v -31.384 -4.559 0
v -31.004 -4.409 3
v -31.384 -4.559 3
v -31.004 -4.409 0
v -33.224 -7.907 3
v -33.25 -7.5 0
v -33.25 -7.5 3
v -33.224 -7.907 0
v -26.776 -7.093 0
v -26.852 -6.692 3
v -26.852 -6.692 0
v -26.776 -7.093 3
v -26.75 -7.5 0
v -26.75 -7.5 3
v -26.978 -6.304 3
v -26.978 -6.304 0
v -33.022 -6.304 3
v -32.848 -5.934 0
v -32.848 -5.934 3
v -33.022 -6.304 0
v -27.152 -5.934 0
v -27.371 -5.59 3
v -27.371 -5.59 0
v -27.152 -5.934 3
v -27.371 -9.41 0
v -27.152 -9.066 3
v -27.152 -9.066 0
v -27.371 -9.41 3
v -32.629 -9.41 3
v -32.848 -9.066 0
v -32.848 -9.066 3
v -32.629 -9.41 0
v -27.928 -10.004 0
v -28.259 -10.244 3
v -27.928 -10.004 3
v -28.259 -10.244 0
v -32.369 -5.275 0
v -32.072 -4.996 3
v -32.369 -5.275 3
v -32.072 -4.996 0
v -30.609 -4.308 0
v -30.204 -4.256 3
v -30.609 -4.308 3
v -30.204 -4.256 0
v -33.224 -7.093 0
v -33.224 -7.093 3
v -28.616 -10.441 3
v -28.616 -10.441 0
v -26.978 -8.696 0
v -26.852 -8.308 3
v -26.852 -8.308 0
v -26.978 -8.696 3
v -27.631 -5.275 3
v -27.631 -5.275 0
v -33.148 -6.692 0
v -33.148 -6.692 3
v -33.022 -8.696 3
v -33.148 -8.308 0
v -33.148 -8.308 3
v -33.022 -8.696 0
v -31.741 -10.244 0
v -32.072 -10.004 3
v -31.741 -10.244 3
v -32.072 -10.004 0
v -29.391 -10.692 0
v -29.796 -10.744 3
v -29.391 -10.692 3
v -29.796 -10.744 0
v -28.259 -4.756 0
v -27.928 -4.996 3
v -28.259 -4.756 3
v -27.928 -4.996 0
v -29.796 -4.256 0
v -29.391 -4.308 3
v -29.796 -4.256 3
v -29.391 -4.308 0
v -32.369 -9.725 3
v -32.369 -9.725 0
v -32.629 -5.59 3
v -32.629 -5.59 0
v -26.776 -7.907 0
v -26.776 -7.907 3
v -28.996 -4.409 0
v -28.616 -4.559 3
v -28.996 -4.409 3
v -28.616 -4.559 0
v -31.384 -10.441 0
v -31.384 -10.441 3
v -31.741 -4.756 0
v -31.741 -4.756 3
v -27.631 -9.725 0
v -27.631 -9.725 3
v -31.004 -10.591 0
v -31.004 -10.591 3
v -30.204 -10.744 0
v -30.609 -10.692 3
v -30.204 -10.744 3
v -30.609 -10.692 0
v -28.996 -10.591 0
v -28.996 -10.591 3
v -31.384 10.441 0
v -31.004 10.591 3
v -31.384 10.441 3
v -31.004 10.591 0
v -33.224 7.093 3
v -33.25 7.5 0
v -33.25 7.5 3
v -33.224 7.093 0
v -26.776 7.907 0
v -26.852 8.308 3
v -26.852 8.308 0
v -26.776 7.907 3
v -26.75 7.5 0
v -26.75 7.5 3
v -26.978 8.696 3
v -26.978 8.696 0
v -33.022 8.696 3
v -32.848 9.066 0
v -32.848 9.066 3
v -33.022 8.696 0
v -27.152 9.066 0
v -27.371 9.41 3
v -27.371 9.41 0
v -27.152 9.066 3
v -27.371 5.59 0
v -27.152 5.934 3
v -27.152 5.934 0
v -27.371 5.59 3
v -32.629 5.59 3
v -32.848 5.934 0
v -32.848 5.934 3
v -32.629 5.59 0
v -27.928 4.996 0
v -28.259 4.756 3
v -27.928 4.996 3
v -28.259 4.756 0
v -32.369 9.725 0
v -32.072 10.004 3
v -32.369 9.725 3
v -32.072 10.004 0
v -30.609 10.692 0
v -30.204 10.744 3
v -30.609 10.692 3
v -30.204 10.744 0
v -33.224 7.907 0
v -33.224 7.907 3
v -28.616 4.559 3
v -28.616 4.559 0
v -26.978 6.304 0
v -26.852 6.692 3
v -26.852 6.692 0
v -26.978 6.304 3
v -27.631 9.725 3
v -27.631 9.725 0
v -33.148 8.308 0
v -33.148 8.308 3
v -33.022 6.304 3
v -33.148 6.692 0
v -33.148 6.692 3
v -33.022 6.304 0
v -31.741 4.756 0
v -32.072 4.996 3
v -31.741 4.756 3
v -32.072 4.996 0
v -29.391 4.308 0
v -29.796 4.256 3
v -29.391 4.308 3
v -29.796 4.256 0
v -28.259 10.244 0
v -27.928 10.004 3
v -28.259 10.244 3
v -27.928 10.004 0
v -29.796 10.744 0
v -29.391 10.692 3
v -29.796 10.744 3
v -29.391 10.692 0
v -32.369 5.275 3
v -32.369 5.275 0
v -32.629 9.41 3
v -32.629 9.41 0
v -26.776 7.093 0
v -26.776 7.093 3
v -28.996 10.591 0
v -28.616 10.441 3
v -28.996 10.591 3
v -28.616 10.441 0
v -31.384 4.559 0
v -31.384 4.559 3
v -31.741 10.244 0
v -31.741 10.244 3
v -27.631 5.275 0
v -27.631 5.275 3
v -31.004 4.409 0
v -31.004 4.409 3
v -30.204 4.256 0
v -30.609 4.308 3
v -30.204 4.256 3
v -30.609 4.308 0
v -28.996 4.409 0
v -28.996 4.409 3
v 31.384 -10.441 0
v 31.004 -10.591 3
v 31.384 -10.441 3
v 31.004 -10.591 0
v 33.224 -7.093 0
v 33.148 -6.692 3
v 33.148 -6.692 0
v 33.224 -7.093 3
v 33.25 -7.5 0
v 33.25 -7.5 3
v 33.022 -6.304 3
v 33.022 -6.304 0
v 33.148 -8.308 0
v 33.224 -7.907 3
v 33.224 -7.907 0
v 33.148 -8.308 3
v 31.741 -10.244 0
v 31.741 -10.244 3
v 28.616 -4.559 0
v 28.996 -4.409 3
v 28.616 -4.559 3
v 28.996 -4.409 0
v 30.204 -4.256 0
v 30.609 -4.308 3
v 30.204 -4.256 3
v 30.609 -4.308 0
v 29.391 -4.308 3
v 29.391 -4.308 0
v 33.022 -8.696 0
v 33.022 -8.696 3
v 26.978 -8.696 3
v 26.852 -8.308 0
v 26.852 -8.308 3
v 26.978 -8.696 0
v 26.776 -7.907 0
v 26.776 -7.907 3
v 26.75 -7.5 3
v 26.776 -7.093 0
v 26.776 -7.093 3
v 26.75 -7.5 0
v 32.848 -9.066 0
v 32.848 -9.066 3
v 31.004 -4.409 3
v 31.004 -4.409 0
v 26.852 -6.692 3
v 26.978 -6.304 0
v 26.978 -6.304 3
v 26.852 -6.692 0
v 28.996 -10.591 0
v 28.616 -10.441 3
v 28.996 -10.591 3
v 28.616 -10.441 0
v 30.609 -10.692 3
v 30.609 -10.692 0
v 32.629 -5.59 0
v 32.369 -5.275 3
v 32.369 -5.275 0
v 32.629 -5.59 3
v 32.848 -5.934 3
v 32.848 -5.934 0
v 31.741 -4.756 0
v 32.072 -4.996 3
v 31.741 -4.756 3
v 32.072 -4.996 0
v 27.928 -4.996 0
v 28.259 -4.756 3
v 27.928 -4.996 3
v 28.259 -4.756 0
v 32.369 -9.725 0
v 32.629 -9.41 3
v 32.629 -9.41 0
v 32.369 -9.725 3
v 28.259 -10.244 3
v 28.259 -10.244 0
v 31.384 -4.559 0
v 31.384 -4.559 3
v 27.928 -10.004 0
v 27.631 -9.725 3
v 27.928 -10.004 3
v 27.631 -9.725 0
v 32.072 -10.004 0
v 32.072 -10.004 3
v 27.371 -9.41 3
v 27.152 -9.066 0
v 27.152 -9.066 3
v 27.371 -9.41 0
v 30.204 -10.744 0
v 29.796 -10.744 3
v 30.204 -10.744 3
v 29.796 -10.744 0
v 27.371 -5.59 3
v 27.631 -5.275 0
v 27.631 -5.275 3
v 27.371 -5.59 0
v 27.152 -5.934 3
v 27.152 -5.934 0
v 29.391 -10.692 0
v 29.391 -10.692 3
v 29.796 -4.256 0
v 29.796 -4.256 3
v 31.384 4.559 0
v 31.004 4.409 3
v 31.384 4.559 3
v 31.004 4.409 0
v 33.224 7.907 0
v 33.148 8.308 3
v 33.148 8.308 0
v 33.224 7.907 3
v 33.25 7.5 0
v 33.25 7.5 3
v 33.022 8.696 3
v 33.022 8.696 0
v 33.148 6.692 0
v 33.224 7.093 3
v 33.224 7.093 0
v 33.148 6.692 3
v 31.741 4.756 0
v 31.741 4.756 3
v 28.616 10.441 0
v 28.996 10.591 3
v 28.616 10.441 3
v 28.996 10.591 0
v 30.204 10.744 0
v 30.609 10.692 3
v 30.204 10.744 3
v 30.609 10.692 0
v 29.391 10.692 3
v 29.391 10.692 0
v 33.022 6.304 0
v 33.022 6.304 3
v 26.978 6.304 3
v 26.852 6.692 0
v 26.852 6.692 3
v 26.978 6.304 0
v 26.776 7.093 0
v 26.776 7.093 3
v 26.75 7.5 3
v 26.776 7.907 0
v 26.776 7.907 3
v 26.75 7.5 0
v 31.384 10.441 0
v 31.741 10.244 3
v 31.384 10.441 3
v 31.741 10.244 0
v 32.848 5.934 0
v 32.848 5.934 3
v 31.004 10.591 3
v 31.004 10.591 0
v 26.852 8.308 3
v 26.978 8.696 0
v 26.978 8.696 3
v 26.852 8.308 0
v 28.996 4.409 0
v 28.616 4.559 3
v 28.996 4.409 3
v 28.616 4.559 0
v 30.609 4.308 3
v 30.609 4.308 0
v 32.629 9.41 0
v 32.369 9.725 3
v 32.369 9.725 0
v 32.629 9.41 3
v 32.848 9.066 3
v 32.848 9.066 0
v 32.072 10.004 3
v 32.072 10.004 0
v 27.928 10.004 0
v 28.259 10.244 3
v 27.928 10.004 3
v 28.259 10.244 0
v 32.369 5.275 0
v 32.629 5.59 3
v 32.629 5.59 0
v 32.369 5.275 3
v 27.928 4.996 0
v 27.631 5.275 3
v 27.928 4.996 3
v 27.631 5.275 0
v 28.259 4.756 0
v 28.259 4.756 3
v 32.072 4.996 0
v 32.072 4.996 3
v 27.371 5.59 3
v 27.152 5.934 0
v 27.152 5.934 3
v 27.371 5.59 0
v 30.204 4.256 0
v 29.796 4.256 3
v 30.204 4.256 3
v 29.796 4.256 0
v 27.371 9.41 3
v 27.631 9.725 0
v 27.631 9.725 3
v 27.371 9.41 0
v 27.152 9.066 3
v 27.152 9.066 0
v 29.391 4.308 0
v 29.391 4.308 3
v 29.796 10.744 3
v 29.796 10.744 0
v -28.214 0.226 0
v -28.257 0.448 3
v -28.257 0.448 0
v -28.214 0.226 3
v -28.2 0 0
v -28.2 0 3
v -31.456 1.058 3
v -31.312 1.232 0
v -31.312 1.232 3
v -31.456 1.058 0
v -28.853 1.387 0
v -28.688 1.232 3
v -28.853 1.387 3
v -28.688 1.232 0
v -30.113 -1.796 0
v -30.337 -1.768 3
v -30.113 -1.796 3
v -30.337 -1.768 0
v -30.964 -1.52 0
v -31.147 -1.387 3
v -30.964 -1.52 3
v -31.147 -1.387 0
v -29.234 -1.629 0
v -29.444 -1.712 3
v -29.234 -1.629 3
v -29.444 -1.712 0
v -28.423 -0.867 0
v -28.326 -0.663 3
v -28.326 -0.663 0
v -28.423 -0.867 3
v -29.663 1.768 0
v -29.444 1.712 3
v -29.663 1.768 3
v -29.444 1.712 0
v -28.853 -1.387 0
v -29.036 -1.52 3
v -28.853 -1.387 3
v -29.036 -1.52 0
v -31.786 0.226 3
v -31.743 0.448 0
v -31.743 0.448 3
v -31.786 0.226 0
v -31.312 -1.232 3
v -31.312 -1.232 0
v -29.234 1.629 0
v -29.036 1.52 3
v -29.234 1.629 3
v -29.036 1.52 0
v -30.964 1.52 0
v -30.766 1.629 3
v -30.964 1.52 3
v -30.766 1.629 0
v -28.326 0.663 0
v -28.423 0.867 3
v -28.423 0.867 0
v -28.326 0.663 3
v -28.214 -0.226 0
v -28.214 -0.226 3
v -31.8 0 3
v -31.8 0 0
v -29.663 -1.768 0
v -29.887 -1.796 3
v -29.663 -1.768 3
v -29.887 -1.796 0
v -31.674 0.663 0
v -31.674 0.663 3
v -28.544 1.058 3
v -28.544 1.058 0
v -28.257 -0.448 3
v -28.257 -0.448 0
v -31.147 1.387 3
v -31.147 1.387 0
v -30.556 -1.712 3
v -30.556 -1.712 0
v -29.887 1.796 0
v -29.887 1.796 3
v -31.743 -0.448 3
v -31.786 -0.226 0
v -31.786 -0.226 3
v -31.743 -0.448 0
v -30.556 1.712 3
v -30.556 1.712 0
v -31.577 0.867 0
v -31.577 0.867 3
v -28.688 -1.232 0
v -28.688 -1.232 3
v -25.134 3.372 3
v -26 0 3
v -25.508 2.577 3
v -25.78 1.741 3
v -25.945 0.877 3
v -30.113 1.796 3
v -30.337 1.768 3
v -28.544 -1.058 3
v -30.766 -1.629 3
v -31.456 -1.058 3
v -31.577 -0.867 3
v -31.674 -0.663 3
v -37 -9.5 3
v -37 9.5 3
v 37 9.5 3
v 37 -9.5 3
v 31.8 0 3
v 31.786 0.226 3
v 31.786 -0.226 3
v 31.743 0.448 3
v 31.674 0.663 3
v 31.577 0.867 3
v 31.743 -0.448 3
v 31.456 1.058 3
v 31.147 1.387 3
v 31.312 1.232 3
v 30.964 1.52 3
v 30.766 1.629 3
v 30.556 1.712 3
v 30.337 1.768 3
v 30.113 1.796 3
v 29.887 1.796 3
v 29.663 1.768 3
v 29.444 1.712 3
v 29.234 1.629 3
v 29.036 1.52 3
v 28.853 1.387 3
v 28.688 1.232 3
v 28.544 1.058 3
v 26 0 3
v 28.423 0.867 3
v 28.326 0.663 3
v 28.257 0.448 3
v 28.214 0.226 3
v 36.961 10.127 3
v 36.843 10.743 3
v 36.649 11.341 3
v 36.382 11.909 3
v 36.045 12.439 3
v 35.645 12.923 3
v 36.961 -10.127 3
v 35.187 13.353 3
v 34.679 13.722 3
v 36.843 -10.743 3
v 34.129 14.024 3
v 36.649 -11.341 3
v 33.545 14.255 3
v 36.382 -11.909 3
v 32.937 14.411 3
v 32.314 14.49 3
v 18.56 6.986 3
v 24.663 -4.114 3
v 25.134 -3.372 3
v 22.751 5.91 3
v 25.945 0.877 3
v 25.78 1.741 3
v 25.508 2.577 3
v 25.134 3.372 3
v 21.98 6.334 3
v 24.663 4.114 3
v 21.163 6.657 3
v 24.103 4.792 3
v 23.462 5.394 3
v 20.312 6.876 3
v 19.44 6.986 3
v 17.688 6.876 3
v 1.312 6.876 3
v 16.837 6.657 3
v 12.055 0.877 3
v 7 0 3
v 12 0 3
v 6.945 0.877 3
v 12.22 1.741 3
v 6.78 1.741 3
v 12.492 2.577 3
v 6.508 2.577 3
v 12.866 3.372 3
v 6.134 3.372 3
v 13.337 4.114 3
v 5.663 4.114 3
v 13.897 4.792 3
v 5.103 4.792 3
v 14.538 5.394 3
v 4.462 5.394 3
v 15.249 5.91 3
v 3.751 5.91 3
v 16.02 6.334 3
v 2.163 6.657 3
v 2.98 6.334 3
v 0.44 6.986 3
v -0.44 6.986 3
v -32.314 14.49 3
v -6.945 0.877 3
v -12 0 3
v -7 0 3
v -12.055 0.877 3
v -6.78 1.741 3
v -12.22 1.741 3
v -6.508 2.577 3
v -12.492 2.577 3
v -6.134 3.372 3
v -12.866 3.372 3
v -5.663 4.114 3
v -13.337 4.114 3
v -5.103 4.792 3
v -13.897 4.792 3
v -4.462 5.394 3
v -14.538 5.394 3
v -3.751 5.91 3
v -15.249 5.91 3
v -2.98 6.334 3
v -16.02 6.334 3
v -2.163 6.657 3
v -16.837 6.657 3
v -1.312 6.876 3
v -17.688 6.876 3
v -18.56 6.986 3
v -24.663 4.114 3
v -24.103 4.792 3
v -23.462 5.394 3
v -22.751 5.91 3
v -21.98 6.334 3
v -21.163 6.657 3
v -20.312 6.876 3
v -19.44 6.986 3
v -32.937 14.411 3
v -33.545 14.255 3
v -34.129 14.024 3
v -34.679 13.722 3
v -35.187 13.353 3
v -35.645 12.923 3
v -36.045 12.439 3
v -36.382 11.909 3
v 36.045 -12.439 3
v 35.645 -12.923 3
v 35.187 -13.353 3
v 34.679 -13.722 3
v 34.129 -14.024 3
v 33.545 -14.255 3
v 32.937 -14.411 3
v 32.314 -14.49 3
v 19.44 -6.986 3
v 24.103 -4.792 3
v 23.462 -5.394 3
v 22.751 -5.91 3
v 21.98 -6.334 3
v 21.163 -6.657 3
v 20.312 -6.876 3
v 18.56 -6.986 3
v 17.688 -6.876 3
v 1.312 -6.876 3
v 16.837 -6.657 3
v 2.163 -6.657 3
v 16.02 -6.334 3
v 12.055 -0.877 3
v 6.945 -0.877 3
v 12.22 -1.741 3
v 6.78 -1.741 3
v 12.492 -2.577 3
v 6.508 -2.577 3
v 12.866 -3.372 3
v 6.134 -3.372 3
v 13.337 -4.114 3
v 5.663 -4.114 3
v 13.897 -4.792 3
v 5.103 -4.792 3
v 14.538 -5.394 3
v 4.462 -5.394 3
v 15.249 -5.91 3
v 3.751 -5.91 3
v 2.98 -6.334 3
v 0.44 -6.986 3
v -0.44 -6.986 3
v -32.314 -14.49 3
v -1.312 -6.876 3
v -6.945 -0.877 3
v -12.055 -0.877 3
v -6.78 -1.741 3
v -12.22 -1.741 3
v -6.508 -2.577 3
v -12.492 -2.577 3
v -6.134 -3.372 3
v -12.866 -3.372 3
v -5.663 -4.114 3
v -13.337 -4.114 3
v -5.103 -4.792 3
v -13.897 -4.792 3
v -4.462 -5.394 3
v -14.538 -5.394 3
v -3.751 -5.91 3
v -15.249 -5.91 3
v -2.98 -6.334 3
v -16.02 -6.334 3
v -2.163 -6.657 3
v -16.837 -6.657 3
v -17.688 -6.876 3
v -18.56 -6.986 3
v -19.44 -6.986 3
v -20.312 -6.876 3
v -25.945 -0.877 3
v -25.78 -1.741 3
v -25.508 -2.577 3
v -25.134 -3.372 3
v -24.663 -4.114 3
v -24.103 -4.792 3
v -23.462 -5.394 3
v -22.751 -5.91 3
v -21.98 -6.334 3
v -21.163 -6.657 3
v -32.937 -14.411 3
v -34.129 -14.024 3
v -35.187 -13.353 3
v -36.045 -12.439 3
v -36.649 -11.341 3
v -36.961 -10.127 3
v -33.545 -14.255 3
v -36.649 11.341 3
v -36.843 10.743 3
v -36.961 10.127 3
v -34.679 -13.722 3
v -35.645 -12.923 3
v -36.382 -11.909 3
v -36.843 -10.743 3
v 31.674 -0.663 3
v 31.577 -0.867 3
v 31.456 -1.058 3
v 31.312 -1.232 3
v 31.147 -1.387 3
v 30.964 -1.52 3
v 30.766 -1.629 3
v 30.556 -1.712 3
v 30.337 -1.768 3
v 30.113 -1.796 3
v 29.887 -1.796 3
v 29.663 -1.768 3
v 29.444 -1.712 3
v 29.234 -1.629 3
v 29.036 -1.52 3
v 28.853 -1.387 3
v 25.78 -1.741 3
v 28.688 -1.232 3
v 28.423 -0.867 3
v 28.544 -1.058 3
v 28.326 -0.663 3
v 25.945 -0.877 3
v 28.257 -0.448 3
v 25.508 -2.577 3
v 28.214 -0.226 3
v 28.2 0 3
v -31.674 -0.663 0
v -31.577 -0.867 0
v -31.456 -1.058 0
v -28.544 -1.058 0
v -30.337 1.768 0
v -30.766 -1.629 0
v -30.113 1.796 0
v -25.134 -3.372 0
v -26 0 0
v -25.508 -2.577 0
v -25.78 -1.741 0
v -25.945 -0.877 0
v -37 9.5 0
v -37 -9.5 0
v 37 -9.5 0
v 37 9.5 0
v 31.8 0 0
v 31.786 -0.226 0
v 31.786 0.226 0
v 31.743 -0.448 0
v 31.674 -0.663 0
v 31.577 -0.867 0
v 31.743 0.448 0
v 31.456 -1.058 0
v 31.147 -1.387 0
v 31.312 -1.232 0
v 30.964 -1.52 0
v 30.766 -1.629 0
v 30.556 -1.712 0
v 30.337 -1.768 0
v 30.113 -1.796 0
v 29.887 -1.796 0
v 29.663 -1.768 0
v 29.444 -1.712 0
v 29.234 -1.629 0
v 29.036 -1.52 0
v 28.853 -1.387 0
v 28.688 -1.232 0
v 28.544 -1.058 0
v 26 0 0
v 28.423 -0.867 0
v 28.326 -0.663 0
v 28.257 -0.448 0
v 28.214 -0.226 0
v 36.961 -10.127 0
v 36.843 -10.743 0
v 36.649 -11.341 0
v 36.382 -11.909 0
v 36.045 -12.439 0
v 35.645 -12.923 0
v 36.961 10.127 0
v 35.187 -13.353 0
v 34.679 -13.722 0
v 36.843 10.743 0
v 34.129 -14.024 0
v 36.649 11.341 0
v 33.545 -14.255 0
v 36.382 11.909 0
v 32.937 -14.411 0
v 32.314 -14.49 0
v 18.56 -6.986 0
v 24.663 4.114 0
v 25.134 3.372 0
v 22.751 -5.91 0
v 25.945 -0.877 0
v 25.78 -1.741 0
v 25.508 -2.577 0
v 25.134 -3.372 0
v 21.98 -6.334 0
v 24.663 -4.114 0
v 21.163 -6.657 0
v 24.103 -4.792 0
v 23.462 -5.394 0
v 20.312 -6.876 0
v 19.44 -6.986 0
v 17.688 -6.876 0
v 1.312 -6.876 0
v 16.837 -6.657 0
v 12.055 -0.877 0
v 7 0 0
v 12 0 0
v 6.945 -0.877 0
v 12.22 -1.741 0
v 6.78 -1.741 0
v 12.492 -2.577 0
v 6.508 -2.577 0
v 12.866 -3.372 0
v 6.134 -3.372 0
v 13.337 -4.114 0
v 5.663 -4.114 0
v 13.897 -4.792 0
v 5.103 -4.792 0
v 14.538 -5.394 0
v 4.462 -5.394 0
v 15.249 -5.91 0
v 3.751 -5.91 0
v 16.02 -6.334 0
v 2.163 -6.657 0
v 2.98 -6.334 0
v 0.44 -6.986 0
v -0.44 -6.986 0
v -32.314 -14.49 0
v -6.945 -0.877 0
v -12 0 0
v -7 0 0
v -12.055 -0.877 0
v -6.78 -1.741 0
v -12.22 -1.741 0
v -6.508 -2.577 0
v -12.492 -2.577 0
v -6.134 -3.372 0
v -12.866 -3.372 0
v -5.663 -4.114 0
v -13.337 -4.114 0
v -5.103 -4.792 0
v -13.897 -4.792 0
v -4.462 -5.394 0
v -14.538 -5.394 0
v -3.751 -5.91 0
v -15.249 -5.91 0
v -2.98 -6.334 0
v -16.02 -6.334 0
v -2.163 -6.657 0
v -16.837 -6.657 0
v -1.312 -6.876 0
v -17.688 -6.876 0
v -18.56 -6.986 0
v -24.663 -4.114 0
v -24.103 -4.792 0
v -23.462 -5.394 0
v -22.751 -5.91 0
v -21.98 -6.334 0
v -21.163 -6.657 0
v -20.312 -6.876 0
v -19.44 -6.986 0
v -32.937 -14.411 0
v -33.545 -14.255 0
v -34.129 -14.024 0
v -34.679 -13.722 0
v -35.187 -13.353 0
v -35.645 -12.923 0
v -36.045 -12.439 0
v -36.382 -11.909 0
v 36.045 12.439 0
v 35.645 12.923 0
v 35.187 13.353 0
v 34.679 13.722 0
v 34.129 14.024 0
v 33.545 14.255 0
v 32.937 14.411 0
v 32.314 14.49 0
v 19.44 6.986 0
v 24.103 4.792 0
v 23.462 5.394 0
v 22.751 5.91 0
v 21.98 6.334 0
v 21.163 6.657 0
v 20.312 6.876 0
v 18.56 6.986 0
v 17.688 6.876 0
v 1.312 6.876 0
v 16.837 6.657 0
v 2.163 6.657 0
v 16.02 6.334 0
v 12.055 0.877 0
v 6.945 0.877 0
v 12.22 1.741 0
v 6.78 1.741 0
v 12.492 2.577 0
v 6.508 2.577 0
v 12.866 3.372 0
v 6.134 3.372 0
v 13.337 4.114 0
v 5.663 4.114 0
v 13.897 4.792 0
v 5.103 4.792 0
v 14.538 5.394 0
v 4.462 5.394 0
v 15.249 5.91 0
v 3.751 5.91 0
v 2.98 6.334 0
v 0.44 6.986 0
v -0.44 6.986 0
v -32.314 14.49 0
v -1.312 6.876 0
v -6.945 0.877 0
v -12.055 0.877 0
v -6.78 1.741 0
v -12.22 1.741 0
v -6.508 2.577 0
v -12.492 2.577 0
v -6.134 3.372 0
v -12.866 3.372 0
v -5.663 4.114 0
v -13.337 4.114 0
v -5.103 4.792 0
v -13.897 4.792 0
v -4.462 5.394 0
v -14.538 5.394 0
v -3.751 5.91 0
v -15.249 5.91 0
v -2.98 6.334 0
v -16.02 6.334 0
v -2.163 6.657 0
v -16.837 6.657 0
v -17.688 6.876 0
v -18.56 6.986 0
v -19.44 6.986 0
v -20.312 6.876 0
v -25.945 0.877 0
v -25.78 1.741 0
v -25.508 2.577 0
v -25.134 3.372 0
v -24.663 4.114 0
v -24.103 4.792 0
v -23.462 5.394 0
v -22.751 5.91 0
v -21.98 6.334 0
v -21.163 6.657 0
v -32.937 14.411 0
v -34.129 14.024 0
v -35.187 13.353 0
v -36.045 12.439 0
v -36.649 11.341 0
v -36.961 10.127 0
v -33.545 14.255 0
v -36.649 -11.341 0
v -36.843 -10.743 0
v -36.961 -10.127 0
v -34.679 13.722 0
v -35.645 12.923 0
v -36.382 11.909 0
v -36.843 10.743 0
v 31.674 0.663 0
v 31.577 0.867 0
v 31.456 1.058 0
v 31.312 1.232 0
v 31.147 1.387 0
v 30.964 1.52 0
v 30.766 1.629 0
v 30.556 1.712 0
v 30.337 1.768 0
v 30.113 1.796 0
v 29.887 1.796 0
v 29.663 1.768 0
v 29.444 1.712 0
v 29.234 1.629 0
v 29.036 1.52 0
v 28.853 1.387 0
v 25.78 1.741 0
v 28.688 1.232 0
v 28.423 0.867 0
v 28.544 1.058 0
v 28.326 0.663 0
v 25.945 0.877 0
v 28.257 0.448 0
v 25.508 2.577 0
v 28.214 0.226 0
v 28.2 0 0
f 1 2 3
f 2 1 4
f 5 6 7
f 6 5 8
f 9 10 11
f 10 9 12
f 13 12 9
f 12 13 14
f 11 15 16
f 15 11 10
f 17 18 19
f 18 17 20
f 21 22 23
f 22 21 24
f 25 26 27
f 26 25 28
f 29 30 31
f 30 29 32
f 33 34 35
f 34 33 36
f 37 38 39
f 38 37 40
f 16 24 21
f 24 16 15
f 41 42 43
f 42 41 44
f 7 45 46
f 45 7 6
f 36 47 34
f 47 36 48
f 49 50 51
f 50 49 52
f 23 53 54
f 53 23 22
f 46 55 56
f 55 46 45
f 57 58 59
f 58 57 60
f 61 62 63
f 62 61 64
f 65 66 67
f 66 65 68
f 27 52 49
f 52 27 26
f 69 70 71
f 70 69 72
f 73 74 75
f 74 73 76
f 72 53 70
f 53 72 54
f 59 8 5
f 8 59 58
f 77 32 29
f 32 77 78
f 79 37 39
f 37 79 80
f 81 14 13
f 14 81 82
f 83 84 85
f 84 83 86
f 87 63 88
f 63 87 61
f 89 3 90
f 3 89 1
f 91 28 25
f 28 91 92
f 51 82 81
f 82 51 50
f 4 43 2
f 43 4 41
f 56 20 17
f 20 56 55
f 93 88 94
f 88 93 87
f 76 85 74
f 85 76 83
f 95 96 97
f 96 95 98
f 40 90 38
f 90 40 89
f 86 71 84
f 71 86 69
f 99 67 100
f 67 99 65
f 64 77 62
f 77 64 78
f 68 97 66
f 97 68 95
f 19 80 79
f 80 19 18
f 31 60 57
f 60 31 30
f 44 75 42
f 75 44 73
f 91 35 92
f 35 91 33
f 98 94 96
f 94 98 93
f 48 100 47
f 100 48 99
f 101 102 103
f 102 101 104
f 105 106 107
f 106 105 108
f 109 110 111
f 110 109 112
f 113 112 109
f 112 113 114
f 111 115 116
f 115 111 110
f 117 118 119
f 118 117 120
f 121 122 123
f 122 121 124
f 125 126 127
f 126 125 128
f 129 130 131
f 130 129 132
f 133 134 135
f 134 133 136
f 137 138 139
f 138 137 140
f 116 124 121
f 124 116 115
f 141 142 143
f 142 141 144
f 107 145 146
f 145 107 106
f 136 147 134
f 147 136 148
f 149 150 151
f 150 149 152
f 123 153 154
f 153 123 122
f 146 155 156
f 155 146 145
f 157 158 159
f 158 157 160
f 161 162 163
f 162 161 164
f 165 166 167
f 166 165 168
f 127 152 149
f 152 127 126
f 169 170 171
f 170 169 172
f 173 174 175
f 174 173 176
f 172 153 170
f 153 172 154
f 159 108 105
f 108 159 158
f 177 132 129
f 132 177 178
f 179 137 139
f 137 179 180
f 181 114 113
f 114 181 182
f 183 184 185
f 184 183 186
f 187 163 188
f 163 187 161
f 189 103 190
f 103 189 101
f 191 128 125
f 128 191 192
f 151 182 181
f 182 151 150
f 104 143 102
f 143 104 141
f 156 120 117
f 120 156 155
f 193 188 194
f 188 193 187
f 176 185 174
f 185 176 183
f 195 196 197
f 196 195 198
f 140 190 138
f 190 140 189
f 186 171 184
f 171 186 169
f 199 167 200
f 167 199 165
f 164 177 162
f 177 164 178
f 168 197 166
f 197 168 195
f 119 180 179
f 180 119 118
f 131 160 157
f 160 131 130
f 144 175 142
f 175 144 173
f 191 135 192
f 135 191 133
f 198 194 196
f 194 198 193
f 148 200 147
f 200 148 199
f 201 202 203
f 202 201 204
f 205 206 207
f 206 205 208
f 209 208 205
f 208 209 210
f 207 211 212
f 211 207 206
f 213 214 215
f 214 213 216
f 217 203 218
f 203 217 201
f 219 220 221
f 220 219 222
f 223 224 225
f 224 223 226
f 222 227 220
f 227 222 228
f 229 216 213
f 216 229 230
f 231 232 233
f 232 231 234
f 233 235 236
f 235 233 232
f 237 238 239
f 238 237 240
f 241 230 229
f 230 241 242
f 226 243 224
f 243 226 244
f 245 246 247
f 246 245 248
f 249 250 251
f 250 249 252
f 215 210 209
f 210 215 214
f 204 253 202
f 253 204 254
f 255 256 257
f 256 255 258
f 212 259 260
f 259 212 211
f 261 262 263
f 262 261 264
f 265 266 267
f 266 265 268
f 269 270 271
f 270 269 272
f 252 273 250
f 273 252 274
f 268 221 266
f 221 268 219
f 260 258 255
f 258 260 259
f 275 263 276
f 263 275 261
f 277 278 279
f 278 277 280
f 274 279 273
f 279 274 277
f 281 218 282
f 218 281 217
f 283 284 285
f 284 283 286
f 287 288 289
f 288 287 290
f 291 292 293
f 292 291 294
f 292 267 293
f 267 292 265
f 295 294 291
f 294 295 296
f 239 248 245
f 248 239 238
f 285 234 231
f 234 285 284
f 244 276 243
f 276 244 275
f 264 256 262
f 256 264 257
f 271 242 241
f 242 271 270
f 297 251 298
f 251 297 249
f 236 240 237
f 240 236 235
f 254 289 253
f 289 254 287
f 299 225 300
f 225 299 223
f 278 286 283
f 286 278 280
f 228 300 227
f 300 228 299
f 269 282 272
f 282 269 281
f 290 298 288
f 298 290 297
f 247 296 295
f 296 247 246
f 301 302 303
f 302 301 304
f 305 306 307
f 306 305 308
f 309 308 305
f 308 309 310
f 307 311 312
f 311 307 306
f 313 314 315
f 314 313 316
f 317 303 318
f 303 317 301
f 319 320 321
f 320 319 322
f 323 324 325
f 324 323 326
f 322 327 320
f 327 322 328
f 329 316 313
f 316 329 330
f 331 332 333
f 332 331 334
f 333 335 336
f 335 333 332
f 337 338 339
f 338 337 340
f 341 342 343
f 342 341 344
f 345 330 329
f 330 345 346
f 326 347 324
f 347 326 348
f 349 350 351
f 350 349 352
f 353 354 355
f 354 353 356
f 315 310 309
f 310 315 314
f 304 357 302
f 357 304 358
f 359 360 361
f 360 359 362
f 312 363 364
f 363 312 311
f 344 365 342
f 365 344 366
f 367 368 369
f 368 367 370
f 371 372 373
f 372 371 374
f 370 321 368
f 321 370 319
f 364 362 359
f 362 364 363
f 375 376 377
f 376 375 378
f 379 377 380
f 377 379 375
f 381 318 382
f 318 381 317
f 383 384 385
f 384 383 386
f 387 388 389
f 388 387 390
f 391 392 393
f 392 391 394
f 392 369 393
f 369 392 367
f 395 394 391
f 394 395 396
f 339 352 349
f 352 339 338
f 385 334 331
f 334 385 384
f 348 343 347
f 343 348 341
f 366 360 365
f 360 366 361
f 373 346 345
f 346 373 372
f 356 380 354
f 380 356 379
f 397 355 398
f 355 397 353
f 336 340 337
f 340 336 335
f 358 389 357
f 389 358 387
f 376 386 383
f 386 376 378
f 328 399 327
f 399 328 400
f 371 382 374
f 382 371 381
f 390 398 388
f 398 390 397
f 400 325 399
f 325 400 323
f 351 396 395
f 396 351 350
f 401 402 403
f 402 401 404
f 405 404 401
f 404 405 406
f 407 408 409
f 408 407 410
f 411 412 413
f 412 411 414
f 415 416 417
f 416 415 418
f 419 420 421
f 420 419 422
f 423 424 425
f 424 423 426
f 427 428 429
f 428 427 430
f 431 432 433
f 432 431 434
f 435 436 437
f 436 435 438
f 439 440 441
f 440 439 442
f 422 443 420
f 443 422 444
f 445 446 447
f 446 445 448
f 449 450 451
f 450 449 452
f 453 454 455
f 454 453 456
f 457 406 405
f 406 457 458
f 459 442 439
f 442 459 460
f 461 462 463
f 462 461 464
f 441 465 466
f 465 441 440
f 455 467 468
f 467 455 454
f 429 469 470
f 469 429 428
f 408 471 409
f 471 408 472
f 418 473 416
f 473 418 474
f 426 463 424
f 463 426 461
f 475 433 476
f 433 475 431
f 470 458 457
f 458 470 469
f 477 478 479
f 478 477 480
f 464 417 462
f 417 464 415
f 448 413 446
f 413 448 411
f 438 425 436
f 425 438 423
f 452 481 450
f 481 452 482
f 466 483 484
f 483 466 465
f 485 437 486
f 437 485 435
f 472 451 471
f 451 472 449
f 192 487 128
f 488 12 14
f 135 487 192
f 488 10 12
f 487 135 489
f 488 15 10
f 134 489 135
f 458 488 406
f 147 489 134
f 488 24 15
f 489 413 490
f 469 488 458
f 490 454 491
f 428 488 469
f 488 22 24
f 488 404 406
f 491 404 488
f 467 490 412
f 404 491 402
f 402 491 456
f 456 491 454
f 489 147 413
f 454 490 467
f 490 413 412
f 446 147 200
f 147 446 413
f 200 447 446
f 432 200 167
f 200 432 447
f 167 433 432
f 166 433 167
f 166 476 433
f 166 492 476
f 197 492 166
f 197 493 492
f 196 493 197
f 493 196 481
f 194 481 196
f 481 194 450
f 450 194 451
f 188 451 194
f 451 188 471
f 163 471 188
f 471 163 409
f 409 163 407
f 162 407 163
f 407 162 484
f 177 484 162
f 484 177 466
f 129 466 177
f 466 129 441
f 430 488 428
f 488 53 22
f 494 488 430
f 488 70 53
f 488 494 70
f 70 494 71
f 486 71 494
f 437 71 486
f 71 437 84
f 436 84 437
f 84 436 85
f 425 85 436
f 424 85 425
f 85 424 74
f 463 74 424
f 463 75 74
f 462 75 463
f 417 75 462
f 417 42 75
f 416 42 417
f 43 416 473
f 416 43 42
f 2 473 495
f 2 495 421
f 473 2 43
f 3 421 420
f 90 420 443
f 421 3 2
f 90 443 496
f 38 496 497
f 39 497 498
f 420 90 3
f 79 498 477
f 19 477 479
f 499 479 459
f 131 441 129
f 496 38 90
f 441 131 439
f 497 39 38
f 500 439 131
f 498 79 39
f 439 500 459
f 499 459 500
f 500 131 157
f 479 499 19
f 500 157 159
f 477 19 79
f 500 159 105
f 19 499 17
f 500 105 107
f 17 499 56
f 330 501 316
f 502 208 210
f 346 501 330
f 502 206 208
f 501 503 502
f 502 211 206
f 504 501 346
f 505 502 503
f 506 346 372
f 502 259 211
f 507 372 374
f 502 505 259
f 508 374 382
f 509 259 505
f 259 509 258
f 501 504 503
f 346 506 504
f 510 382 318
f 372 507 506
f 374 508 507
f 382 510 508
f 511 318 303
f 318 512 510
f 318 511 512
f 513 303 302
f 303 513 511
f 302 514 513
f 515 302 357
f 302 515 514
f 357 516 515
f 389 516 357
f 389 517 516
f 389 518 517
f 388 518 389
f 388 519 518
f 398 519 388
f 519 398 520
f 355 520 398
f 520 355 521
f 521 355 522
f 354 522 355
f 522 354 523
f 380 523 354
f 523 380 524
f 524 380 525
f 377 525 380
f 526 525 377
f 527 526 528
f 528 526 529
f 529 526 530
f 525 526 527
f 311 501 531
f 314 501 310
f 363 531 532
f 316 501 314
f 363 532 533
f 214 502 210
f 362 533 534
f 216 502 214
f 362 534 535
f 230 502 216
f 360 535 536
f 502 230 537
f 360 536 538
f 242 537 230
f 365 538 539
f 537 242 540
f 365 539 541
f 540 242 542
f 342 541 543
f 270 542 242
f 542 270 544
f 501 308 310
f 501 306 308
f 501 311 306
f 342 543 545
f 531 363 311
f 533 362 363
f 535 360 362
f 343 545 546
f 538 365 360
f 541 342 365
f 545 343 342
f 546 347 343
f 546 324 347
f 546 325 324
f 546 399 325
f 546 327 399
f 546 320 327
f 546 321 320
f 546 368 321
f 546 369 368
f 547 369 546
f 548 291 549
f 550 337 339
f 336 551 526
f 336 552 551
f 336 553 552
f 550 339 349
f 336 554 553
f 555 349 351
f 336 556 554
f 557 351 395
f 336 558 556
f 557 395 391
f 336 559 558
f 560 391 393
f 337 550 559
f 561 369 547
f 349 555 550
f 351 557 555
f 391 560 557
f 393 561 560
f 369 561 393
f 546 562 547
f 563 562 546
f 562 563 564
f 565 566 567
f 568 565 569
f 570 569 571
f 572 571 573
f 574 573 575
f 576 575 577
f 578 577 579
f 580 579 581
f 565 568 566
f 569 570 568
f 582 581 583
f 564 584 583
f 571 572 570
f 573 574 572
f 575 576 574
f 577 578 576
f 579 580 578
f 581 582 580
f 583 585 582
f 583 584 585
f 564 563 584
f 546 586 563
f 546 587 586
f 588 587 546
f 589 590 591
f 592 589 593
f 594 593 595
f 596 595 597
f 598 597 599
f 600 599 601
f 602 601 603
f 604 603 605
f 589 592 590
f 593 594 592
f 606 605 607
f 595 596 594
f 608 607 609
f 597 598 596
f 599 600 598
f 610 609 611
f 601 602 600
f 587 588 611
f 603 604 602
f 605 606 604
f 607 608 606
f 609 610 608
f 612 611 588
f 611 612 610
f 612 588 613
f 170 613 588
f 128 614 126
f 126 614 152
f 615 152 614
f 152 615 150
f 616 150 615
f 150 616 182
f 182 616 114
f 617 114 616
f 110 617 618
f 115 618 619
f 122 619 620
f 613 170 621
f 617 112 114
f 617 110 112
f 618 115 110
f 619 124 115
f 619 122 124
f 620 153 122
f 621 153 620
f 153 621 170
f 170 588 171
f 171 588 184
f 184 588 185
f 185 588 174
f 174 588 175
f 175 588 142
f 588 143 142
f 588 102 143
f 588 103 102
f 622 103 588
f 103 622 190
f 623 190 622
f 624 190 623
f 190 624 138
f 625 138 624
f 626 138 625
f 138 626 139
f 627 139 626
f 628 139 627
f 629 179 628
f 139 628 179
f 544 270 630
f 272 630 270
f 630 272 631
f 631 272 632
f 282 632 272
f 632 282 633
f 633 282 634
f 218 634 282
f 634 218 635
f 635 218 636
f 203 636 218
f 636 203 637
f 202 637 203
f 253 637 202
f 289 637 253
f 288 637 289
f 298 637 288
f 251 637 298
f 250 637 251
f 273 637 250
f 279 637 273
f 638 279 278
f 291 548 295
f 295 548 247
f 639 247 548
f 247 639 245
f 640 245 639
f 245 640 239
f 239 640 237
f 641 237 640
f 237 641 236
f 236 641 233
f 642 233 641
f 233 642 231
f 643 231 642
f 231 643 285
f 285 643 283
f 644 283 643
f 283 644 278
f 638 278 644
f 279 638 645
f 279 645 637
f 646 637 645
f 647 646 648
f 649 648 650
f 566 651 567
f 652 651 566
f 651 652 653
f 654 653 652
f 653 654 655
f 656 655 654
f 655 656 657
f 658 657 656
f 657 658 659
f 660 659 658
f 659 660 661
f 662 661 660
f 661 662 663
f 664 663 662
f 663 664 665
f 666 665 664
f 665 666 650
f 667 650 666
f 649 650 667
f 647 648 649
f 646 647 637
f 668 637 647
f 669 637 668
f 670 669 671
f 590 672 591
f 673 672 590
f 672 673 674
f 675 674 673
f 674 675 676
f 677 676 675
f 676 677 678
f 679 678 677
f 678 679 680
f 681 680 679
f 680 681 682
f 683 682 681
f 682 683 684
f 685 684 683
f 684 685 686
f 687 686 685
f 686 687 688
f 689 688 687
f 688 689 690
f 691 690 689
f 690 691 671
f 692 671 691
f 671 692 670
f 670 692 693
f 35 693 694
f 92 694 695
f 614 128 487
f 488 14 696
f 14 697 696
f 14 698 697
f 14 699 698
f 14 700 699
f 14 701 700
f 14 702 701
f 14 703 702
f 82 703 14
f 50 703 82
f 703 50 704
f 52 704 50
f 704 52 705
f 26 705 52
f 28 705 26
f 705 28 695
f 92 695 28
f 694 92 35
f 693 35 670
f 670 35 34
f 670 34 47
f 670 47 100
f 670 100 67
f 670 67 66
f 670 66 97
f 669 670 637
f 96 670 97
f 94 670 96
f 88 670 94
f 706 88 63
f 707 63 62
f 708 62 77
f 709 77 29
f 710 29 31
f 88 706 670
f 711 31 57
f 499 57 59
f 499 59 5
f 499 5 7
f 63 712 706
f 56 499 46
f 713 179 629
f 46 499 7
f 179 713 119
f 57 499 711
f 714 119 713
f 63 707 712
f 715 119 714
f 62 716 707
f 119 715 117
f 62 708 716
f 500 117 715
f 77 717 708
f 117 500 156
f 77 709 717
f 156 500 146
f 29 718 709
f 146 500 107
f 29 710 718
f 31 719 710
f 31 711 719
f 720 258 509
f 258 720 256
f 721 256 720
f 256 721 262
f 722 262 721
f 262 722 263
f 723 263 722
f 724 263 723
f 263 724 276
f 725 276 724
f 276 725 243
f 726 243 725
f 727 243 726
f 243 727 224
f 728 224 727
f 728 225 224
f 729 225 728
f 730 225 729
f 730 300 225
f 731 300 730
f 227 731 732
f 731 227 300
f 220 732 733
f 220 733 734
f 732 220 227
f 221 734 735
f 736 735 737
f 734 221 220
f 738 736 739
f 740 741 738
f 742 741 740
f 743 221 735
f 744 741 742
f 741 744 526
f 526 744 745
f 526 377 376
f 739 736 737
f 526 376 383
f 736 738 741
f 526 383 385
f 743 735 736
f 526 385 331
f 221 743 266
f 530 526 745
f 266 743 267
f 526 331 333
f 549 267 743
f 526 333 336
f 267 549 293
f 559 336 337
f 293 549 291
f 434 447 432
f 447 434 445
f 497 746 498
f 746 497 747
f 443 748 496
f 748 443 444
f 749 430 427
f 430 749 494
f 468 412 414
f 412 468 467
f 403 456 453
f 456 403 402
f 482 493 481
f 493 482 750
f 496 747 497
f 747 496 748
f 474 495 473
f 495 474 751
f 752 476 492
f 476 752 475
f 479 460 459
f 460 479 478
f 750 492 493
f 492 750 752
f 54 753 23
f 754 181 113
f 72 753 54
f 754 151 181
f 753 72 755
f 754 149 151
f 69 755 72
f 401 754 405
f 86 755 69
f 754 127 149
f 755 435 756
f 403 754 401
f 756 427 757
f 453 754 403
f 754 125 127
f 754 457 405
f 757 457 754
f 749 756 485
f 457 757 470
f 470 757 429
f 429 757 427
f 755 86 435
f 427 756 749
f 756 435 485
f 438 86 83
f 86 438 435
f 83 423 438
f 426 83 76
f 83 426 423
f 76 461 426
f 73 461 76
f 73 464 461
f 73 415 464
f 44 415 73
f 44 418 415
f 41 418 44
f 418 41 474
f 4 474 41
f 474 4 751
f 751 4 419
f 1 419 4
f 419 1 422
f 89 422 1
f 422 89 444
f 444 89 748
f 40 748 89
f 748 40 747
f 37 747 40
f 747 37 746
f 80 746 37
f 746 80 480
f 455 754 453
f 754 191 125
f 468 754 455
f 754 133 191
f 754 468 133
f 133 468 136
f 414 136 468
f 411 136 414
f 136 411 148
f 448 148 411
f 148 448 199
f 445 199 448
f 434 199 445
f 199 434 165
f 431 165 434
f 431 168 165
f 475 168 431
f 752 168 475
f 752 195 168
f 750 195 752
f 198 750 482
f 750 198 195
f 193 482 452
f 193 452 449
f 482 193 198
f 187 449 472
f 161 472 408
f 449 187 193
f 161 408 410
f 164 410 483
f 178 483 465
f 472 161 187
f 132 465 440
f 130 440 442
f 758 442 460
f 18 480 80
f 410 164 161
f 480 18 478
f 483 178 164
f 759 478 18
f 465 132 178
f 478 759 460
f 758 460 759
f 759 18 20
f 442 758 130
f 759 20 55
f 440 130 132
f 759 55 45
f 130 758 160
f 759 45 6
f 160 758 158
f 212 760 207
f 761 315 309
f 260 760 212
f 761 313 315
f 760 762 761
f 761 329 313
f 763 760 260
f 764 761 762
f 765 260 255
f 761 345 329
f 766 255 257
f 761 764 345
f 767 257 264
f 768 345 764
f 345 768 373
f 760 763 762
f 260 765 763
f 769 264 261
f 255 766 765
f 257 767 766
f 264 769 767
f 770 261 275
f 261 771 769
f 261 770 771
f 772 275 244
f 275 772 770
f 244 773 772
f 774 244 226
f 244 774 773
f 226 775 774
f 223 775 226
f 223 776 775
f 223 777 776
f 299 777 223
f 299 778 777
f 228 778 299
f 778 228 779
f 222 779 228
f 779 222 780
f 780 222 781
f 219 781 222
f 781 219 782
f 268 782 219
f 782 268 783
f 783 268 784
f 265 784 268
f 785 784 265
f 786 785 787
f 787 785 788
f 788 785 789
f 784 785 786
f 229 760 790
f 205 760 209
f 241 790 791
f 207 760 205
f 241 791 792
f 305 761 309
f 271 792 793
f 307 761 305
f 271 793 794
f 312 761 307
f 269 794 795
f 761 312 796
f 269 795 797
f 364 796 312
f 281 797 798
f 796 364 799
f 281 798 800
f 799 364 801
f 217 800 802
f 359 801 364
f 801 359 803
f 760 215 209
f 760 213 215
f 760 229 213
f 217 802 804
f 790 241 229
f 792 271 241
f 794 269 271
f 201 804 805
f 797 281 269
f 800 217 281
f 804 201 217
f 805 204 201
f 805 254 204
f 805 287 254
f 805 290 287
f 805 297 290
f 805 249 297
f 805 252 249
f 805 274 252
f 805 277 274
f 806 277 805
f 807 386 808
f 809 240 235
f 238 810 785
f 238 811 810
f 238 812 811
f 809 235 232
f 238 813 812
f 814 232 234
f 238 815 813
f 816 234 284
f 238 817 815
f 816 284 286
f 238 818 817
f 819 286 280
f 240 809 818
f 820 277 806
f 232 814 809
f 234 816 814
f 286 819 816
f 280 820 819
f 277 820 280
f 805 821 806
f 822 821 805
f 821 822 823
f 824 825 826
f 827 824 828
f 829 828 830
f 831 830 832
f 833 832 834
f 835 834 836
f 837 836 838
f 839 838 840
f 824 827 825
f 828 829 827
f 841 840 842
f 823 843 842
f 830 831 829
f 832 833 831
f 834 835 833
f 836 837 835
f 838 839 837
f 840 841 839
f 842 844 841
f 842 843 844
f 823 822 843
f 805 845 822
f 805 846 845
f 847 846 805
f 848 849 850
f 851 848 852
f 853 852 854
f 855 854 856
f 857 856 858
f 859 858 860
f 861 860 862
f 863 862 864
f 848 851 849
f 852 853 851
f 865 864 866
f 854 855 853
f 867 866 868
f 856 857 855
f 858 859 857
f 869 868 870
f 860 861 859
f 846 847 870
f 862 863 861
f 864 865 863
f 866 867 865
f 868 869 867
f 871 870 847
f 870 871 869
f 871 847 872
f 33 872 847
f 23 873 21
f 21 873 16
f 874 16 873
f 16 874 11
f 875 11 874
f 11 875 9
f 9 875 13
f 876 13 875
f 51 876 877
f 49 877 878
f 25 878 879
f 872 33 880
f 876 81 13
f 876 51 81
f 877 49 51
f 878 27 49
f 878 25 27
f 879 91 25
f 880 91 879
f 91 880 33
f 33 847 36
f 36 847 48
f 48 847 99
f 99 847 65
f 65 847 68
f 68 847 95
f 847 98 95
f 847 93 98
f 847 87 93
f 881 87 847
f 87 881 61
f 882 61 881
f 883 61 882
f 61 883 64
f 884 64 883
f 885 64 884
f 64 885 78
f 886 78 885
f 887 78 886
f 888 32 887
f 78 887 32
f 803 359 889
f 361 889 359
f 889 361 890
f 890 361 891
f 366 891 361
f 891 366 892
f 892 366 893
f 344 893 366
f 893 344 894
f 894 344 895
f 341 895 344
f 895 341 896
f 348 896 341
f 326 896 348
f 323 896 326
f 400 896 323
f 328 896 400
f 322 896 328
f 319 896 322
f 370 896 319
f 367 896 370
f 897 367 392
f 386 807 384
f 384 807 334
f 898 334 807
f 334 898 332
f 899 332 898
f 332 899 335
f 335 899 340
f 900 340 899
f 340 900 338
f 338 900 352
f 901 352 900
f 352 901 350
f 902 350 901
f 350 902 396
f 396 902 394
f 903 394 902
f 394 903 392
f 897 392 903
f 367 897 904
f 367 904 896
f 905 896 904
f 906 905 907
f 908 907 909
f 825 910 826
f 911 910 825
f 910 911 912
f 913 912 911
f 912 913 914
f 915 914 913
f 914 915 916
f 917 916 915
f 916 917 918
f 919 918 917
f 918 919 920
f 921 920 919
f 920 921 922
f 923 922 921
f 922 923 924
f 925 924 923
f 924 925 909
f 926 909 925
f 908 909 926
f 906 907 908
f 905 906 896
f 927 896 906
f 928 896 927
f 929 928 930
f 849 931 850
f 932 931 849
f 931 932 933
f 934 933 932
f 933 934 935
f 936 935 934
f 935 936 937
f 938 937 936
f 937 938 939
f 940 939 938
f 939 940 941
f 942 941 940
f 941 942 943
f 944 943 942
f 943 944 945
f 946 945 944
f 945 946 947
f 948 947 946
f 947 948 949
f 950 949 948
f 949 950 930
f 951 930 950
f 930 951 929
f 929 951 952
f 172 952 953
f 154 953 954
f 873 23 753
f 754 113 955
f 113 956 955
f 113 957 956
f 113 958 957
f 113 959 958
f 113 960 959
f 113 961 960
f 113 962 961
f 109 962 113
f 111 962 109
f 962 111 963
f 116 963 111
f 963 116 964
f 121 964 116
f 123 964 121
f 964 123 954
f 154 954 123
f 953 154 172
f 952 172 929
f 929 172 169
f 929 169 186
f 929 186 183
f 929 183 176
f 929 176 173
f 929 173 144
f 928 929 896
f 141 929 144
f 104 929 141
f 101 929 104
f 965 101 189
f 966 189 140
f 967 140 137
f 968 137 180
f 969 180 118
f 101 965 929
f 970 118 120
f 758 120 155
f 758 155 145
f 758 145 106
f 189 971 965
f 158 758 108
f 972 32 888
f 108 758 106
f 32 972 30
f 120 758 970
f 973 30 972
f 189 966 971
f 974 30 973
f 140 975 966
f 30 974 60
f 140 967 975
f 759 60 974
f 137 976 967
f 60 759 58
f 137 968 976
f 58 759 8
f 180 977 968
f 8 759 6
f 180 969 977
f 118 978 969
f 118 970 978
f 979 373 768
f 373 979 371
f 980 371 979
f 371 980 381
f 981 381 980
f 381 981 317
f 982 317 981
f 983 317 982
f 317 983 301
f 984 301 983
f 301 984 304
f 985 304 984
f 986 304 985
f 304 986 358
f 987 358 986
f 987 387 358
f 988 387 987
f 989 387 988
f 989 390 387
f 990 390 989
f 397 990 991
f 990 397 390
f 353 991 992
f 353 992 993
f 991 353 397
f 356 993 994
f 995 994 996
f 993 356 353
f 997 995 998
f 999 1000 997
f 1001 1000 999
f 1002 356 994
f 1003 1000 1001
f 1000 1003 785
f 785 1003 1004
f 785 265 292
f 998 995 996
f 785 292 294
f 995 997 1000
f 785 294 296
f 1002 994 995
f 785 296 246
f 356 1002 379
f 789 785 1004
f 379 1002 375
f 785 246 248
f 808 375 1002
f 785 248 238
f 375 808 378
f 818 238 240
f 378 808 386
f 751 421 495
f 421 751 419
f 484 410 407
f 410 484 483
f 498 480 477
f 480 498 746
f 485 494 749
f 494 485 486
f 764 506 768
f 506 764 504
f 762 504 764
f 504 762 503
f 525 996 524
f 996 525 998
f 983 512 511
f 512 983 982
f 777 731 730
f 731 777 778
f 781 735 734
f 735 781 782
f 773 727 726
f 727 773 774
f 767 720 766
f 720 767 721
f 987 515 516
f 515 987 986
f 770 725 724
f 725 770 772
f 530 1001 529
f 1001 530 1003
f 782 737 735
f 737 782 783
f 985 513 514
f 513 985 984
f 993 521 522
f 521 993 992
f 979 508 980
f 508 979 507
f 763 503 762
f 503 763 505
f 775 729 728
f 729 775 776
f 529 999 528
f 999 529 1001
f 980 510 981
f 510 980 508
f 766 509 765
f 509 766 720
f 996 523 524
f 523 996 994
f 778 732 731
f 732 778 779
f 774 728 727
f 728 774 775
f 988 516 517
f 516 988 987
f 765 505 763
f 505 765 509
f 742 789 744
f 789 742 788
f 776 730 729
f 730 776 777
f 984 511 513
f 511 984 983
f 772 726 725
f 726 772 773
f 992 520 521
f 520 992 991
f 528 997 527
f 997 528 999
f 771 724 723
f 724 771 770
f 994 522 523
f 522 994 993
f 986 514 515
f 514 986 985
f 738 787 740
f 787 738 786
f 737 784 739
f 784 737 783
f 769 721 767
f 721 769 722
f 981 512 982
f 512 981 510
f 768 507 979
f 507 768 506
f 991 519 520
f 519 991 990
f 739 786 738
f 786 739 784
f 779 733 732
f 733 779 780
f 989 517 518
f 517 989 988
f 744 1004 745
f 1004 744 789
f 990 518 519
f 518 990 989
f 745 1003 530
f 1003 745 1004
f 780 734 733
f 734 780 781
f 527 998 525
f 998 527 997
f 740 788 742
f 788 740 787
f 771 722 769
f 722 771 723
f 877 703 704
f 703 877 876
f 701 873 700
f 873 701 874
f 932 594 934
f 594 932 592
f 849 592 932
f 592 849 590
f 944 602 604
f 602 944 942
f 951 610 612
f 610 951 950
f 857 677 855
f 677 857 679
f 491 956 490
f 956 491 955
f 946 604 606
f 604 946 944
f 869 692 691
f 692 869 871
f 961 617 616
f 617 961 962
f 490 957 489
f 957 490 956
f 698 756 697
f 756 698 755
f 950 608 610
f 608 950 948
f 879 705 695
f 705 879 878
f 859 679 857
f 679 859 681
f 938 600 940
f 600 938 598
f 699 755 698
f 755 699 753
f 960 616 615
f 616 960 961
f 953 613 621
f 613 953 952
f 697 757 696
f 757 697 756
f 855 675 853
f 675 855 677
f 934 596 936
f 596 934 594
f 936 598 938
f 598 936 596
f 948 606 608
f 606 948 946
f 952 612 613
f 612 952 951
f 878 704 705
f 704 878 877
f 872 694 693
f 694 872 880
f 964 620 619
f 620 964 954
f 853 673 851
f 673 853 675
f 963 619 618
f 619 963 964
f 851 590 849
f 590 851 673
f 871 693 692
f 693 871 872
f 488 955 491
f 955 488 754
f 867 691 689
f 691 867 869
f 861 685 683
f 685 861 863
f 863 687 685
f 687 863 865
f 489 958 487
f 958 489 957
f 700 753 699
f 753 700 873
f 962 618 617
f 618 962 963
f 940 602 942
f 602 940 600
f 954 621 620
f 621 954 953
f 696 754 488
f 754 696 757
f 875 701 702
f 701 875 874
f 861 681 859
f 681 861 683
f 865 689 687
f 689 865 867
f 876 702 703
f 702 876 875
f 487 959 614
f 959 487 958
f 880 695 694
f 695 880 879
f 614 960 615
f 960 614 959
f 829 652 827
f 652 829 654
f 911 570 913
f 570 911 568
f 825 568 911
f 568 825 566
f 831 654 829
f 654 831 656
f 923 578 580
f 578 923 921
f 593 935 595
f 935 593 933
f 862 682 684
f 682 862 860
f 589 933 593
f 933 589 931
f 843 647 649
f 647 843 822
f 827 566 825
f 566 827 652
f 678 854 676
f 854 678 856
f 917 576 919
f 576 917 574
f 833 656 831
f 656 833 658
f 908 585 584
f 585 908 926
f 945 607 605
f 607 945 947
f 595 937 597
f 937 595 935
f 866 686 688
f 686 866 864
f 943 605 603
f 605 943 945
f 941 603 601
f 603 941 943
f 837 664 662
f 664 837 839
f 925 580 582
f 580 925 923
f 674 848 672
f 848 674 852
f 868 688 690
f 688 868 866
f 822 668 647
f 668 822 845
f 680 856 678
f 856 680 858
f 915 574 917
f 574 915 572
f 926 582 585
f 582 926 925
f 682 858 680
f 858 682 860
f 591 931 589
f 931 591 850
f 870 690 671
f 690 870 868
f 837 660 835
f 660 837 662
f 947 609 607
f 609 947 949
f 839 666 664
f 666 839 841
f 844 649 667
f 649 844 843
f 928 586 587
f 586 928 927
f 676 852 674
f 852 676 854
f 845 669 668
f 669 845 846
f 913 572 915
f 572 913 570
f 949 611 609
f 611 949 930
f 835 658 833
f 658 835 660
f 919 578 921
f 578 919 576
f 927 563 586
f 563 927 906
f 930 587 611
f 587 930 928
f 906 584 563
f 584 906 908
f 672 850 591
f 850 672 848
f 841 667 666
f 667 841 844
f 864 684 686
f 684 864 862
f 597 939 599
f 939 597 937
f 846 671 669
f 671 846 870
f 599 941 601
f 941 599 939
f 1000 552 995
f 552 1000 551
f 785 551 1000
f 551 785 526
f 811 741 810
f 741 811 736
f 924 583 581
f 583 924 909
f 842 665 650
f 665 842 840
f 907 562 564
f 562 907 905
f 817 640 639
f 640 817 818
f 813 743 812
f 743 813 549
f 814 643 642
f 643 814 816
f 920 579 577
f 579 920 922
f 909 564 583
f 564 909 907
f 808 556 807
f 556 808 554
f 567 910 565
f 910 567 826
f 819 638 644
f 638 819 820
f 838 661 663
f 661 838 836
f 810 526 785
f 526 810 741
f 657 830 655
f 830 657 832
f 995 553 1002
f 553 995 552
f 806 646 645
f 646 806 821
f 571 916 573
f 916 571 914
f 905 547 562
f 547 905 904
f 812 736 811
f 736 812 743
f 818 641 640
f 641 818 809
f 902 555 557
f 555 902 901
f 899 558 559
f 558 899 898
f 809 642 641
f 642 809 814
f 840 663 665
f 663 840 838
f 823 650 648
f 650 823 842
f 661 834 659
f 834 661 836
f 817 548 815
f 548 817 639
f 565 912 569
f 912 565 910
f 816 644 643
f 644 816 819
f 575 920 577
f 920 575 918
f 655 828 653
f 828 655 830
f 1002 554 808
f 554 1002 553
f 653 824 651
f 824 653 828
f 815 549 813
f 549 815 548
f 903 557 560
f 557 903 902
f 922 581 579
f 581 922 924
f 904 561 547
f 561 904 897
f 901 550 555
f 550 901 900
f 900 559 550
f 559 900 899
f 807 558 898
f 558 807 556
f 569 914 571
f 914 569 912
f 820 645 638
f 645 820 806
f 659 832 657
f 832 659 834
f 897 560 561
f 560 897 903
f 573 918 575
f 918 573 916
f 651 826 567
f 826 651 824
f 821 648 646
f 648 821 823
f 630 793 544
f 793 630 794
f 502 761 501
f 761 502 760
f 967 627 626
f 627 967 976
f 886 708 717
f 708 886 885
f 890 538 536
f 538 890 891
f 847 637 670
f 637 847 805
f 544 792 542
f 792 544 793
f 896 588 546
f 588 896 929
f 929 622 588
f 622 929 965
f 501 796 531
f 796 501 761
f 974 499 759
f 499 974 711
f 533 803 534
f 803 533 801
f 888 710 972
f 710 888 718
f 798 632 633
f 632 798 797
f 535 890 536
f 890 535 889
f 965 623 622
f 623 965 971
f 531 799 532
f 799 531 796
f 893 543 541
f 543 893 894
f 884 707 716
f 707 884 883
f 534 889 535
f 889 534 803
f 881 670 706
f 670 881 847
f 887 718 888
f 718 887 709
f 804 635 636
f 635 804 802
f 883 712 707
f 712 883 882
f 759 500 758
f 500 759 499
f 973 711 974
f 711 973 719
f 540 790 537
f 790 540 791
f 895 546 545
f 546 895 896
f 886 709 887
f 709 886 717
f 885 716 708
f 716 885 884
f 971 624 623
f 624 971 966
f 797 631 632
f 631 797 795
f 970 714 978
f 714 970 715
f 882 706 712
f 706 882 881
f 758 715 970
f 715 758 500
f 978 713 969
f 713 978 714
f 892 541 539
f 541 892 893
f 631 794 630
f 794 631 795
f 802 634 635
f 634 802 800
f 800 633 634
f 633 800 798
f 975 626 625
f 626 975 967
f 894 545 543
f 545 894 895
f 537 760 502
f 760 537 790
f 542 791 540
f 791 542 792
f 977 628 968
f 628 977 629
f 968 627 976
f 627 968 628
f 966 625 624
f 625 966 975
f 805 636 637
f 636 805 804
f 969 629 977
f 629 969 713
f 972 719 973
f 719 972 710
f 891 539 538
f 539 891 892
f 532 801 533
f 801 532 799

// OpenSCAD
$fn = 50;


difference() {
	union() {
		hull() {
			translate(v = [-32.0000000000, 9.5000000000, 0]) {
				cylinder(h = 3, r = 5);
			}
			translate(v = [32.0000000000, 9.5000000000, 0]) {
				cylinder(h = 3, r = 5);
			}
			translate(v = [-32.0000000000, -9.5000000000, 0]) {
				cylinder(h = 3, r = 5);
			}
			translate(v = [32.0000000000, -9.5000000000, 0]) {
				cylinder(h = 3, r = 5);
			}
		}
	}
	union() {
		#translate(v = [-30.0000000000, -7.5000000000, 0]) {
			cylinder(h = 3, r = 3.2500000000);
		}
		#translate(v = [-30.0000000000, 7.5000000000, 0]) {
			cylinder(h = 3, r = 3.2500000000);
		}
		#translate(v = [30.0000000000, -7.5000000000, 0]) {
			cylinder(h = 3, r = 3.2500000000);
		}
		#translate(v = [30.0000000000, 7.5000000000, 0]) {
			cylinder(h = 3, r = 3.2500000000);
		}
		#translate(v = [-30.0000000000, -7.5000000000, -100.0000000000]) {
			cylinder(h = 200, r = 3.2500000000);
		}
		#translate(v = [-30.0000000000, 7.5000000000, -100.0000000000]) {
			cylinder(h = 200, r = 3.2500000000);
		}
		#translate(v = [30.0000000000, -7.5000000000, -100.0000000000]) {
			cylinder(h = 200, r = 3.2500000000);
		}
		#translate(v = [30.0000000000, 7.5000000000, -100.0000000000]) {
			cylinder(h = 200, r = 3.2500000000);
		}
		#translate(v = [-30.0000000000, -7.5000000000, 0]) {
			cylinder(h = 3, r = 1.8000000000);
		}
		#translate(v = [-30.0000000000, 0.0000000000, 0]) {
			cylinder(h = 3, r = 1.8000000000);
		}
		#translate(v = [-30.0000000000, 7.5000000000, 0]) {
			cylinder(h = 3, r = 1.8000000000);
		}
		#translate(v = [30.0000000000, -7.5000000000, 0]) {
			cylinder(h = 3, r = 1.8000000000);
		}
		#translate(v = [30.0000000000, 0.0000000000, 0]) {
			cylinder(h = 3, r = 1.8000000000);
		}
		#translate(v = [30.0000000000, 7.5000000000, 0]) {
			cylinder(h = 3, r = 1.8000000000);
		}
		#translate(v = [-30.0000000000, -7.5000000000, 0]) {
			cylinder(h = 3, r = 1.8000000000);
		}
		#translate(v = [-30.0000000000, 0.0000000000, 0]) {
			cylinder(h = 3, r = 1.8000000000);
		}
		#translate(v = [-30.0000000000, 7.5000000000, 0]) {
			cylinder(h = 3, r = 1.8000000000);
		}
		#translate(v = [30.0000000000, -7.5000000000, 0]) {
			cylinder(h = 3, r = 1.8000000000);
		}
		#translate(v = [30.0000000000, 0.0000000000, 0]) {
			cylinder(h = 3, r = 1.8000000000);
		}
		#translate(v = [30.0000000000, 7.5000000000, 0]) {
			cylinder(h = 3, r = 1.8000000000);
		}
		#translate(v = [-30.0000000000, -7.5000000000, 0]) {
			cylinder(h = 3, r = 1.8000000000);
		}
		#translate(v = [-30.0000000000, 0.0000000000, 0]) {
			cylinder(h = 3, r = 1.8000000000);
		}
		#translate(v = [-30.0000000000, 7.5000000000, 0]) {
			cylinder(h = 3, r = 1.8000000000);
		}
		#translate(v = [30.0000000000, -7.5000000000, 0]) {
			cylinder(h = 3, r = 1.8000000000);
		}
		#translate(v = [30.0000000000, 0.0000000000, 0]) {
			cylinder(h = 3, r = 1.8000000000);
		}
		#translate(v = [30.0000000000, 7.5000000000, 0]) {
			cylinder(h = 3, r = 1.8000000000);
		}
		#translate(v = [-19.0000000000, 0, 0]) {
			cylinder(h = 3, r = 7.0000000000);
		}
		#cylinder(h = 3, r = 7.0000000000);
		#translate(v = [19.0000000000, 0, 0]) {
			cylinder(h = 3, r = 7.0000000000);
		}
	}
}
